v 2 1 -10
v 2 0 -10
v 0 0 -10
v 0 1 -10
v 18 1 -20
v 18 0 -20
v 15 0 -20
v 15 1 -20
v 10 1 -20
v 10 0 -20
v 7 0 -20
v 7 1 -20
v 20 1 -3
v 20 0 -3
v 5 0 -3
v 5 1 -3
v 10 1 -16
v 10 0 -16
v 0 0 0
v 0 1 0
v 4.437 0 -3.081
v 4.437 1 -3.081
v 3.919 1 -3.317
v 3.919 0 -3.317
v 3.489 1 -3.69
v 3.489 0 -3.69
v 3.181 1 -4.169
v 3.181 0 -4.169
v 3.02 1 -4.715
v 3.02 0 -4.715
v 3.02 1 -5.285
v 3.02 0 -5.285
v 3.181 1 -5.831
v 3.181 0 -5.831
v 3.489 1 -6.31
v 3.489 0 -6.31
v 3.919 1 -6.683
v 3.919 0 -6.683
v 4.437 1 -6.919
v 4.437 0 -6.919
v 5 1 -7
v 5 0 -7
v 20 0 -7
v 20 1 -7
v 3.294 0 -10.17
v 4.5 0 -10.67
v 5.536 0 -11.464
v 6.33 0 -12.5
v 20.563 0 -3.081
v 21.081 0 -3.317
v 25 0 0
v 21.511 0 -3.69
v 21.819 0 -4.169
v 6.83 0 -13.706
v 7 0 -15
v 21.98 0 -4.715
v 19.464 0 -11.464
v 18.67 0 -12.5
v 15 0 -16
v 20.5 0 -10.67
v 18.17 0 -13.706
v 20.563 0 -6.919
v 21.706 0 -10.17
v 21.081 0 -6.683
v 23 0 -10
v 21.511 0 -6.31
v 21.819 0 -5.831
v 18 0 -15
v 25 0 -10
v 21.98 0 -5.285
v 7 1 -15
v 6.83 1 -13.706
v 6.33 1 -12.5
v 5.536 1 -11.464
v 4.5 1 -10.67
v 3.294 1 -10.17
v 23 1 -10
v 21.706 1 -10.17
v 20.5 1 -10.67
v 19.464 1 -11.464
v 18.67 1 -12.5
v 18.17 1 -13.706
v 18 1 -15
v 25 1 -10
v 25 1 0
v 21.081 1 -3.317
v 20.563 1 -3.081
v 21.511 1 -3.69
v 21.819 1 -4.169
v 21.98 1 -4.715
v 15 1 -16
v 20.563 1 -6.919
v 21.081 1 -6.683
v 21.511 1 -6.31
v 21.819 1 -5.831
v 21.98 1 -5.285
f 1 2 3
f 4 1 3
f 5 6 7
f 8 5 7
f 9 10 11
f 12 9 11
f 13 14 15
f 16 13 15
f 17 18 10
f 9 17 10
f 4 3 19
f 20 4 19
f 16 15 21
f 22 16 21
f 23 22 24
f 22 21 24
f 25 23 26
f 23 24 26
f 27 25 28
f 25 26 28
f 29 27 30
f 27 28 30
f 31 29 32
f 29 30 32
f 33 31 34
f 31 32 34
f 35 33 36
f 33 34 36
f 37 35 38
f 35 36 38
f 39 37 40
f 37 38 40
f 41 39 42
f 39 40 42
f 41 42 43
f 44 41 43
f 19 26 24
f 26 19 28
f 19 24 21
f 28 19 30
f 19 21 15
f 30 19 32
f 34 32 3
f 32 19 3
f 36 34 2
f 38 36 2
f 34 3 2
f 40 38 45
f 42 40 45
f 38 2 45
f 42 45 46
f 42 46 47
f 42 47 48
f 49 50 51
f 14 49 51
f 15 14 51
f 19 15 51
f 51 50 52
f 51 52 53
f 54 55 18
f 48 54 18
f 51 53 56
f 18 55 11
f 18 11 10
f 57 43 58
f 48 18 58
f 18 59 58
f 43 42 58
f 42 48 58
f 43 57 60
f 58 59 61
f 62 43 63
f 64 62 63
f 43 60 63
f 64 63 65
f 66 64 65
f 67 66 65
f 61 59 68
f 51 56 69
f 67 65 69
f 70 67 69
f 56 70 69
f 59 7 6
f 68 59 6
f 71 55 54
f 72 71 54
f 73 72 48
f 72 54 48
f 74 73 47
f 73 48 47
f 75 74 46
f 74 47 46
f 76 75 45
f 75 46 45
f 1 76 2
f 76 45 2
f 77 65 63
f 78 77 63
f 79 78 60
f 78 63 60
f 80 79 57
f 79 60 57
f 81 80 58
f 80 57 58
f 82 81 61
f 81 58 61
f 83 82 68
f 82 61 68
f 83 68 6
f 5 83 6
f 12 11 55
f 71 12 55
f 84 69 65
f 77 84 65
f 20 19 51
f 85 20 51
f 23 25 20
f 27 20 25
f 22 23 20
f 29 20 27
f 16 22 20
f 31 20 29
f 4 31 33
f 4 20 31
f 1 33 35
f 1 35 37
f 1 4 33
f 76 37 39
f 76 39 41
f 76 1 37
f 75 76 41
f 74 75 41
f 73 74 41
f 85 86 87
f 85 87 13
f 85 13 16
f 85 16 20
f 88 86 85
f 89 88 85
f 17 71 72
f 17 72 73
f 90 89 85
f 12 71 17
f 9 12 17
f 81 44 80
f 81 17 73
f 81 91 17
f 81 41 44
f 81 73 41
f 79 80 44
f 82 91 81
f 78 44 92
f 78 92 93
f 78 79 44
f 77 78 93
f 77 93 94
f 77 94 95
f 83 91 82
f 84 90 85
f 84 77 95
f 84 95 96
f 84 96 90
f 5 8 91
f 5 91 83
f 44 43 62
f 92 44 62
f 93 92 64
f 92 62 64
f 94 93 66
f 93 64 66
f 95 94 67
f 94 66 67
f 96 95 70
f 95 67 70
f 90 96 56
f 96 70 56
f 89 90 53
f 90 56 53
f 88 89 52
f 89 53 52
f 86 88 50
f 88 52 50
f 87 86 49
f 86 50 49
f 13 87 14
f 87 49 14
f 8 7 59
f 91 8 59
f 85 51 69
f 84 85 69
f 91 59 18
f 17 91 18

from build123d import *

# Parameters (mm, degrees)
BOSS_EXTRUDE1_DEPTH = 1


with BuildPart() as part:
    # Sketch1 → Boss-Extrude1 (new body)
    with BuildSketch(Plane(origin=(0, 0, 0), x_dir=(1, 0, 0), z_dir=(0, 1, 0))):
        with BuildLine():
            Line((0, 0), (25, 0))
            Line((25, 0), (25, 10))
            Line((25, 10), (23, 10))
            ThreePointArc((23, 10), (19.464466094, 11.464466094), (18, 15))
            Line((18, 15), (18, 20))
            Line((18, 20), (15, 20))
            Line((15, 20), (15, 16))
            Line((15, 16), (10, 16))
            Line((10, 16), (10, 20))
            Line((10, 20), (7, 20))
            Line((7, 20), (7, 15))
            ThreePointArc((7, 15), (5.535533906, 11.464466094), (2, 10))
            Line((2, 10), (0, 10))
            Line((0, 10), (0, 0))
        make_face()
        with BuildLine():
            Line((5, 7), (20, 7))
            ThreePointArc((20, 7), (22, 5), (20, 3))
            Line((20, 3), (5, 3))
            ThreePointArc((5, 3), (3, 5), (5, 7))
        make_face(mode=Mode.SUBTRACT)
    extrude(amount=BOSS_EXTRUDE1_DEPTH)


solid = part.part
